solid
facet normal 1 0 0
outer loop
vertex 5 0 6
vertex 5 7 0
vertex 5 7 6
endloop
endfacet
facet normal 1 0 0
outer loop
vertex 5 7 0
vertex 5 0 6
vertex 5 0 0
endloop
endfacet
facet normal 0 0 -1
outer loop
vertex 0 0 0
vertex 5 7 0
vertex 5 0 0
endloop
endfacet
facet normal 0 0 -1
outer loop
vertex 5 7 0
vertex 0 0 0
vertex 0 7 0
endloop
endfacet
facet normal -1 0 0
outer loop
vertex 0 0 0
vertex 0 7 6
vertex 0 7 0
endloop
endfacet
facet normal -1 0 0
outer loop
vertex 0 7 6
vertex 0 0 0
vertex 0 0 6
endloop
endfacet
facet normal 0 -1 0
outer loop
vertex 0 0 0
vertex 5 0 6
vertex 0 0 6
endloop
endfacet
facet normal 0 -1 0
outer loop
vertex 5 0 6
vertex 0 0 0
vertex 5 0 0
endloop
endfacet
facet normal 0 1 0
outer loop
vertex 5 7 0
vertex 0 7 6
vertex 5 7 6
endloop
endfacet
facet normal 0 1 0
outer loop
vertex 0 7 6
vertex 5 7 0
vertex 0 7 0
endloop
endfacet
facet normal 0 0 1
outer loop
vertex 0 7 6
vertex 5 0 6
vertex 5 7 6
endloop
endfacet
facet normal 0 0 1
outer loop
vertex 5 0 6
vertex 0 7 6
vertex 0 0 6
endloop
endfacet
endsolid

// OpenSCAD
translate([2.5, 1.5, 1.0]) color([0.41212019308576986, 0.49358197644734136, 0.44010860560926524]) cube([5, 3, 2], center=true);
translate([2.5, 4.0, 1.5]) color([0.0856157398333921, 0.2411443971002879, 0.8262650576639278]) cube([5, 2, 3], center=true);
translate([2.5, 6.0, 1.5]) color([0.15379567752788093, 0.8842528530898255, 0.2134665283608419]) cube([5, 2, 3], center=true);
translate([2.5, 1.5, 3.0]) color([0.6127566924478359, 0.818008657000479, 0.5590112191053322]) cube([5, 3, 2], center=true);
translate([2.5, 4.0, 4.5]) color([0.8866043301622452, 0.39447102725022787, 0.9589163376419946]) cube([5, 2, 3], center=true);
translate([2.5, 6.0, 4.5]) color([0.24972819156954773, 0.22005049979750413, 0.8404590105346786]) cube([5, 2, 3], center=true);
translate([2.5, 1.5, 5.0]) color([0.2789960200671917, 0.35210354864297055, 0.9946691500756418]) cube([5, 3, 2], center=true);
